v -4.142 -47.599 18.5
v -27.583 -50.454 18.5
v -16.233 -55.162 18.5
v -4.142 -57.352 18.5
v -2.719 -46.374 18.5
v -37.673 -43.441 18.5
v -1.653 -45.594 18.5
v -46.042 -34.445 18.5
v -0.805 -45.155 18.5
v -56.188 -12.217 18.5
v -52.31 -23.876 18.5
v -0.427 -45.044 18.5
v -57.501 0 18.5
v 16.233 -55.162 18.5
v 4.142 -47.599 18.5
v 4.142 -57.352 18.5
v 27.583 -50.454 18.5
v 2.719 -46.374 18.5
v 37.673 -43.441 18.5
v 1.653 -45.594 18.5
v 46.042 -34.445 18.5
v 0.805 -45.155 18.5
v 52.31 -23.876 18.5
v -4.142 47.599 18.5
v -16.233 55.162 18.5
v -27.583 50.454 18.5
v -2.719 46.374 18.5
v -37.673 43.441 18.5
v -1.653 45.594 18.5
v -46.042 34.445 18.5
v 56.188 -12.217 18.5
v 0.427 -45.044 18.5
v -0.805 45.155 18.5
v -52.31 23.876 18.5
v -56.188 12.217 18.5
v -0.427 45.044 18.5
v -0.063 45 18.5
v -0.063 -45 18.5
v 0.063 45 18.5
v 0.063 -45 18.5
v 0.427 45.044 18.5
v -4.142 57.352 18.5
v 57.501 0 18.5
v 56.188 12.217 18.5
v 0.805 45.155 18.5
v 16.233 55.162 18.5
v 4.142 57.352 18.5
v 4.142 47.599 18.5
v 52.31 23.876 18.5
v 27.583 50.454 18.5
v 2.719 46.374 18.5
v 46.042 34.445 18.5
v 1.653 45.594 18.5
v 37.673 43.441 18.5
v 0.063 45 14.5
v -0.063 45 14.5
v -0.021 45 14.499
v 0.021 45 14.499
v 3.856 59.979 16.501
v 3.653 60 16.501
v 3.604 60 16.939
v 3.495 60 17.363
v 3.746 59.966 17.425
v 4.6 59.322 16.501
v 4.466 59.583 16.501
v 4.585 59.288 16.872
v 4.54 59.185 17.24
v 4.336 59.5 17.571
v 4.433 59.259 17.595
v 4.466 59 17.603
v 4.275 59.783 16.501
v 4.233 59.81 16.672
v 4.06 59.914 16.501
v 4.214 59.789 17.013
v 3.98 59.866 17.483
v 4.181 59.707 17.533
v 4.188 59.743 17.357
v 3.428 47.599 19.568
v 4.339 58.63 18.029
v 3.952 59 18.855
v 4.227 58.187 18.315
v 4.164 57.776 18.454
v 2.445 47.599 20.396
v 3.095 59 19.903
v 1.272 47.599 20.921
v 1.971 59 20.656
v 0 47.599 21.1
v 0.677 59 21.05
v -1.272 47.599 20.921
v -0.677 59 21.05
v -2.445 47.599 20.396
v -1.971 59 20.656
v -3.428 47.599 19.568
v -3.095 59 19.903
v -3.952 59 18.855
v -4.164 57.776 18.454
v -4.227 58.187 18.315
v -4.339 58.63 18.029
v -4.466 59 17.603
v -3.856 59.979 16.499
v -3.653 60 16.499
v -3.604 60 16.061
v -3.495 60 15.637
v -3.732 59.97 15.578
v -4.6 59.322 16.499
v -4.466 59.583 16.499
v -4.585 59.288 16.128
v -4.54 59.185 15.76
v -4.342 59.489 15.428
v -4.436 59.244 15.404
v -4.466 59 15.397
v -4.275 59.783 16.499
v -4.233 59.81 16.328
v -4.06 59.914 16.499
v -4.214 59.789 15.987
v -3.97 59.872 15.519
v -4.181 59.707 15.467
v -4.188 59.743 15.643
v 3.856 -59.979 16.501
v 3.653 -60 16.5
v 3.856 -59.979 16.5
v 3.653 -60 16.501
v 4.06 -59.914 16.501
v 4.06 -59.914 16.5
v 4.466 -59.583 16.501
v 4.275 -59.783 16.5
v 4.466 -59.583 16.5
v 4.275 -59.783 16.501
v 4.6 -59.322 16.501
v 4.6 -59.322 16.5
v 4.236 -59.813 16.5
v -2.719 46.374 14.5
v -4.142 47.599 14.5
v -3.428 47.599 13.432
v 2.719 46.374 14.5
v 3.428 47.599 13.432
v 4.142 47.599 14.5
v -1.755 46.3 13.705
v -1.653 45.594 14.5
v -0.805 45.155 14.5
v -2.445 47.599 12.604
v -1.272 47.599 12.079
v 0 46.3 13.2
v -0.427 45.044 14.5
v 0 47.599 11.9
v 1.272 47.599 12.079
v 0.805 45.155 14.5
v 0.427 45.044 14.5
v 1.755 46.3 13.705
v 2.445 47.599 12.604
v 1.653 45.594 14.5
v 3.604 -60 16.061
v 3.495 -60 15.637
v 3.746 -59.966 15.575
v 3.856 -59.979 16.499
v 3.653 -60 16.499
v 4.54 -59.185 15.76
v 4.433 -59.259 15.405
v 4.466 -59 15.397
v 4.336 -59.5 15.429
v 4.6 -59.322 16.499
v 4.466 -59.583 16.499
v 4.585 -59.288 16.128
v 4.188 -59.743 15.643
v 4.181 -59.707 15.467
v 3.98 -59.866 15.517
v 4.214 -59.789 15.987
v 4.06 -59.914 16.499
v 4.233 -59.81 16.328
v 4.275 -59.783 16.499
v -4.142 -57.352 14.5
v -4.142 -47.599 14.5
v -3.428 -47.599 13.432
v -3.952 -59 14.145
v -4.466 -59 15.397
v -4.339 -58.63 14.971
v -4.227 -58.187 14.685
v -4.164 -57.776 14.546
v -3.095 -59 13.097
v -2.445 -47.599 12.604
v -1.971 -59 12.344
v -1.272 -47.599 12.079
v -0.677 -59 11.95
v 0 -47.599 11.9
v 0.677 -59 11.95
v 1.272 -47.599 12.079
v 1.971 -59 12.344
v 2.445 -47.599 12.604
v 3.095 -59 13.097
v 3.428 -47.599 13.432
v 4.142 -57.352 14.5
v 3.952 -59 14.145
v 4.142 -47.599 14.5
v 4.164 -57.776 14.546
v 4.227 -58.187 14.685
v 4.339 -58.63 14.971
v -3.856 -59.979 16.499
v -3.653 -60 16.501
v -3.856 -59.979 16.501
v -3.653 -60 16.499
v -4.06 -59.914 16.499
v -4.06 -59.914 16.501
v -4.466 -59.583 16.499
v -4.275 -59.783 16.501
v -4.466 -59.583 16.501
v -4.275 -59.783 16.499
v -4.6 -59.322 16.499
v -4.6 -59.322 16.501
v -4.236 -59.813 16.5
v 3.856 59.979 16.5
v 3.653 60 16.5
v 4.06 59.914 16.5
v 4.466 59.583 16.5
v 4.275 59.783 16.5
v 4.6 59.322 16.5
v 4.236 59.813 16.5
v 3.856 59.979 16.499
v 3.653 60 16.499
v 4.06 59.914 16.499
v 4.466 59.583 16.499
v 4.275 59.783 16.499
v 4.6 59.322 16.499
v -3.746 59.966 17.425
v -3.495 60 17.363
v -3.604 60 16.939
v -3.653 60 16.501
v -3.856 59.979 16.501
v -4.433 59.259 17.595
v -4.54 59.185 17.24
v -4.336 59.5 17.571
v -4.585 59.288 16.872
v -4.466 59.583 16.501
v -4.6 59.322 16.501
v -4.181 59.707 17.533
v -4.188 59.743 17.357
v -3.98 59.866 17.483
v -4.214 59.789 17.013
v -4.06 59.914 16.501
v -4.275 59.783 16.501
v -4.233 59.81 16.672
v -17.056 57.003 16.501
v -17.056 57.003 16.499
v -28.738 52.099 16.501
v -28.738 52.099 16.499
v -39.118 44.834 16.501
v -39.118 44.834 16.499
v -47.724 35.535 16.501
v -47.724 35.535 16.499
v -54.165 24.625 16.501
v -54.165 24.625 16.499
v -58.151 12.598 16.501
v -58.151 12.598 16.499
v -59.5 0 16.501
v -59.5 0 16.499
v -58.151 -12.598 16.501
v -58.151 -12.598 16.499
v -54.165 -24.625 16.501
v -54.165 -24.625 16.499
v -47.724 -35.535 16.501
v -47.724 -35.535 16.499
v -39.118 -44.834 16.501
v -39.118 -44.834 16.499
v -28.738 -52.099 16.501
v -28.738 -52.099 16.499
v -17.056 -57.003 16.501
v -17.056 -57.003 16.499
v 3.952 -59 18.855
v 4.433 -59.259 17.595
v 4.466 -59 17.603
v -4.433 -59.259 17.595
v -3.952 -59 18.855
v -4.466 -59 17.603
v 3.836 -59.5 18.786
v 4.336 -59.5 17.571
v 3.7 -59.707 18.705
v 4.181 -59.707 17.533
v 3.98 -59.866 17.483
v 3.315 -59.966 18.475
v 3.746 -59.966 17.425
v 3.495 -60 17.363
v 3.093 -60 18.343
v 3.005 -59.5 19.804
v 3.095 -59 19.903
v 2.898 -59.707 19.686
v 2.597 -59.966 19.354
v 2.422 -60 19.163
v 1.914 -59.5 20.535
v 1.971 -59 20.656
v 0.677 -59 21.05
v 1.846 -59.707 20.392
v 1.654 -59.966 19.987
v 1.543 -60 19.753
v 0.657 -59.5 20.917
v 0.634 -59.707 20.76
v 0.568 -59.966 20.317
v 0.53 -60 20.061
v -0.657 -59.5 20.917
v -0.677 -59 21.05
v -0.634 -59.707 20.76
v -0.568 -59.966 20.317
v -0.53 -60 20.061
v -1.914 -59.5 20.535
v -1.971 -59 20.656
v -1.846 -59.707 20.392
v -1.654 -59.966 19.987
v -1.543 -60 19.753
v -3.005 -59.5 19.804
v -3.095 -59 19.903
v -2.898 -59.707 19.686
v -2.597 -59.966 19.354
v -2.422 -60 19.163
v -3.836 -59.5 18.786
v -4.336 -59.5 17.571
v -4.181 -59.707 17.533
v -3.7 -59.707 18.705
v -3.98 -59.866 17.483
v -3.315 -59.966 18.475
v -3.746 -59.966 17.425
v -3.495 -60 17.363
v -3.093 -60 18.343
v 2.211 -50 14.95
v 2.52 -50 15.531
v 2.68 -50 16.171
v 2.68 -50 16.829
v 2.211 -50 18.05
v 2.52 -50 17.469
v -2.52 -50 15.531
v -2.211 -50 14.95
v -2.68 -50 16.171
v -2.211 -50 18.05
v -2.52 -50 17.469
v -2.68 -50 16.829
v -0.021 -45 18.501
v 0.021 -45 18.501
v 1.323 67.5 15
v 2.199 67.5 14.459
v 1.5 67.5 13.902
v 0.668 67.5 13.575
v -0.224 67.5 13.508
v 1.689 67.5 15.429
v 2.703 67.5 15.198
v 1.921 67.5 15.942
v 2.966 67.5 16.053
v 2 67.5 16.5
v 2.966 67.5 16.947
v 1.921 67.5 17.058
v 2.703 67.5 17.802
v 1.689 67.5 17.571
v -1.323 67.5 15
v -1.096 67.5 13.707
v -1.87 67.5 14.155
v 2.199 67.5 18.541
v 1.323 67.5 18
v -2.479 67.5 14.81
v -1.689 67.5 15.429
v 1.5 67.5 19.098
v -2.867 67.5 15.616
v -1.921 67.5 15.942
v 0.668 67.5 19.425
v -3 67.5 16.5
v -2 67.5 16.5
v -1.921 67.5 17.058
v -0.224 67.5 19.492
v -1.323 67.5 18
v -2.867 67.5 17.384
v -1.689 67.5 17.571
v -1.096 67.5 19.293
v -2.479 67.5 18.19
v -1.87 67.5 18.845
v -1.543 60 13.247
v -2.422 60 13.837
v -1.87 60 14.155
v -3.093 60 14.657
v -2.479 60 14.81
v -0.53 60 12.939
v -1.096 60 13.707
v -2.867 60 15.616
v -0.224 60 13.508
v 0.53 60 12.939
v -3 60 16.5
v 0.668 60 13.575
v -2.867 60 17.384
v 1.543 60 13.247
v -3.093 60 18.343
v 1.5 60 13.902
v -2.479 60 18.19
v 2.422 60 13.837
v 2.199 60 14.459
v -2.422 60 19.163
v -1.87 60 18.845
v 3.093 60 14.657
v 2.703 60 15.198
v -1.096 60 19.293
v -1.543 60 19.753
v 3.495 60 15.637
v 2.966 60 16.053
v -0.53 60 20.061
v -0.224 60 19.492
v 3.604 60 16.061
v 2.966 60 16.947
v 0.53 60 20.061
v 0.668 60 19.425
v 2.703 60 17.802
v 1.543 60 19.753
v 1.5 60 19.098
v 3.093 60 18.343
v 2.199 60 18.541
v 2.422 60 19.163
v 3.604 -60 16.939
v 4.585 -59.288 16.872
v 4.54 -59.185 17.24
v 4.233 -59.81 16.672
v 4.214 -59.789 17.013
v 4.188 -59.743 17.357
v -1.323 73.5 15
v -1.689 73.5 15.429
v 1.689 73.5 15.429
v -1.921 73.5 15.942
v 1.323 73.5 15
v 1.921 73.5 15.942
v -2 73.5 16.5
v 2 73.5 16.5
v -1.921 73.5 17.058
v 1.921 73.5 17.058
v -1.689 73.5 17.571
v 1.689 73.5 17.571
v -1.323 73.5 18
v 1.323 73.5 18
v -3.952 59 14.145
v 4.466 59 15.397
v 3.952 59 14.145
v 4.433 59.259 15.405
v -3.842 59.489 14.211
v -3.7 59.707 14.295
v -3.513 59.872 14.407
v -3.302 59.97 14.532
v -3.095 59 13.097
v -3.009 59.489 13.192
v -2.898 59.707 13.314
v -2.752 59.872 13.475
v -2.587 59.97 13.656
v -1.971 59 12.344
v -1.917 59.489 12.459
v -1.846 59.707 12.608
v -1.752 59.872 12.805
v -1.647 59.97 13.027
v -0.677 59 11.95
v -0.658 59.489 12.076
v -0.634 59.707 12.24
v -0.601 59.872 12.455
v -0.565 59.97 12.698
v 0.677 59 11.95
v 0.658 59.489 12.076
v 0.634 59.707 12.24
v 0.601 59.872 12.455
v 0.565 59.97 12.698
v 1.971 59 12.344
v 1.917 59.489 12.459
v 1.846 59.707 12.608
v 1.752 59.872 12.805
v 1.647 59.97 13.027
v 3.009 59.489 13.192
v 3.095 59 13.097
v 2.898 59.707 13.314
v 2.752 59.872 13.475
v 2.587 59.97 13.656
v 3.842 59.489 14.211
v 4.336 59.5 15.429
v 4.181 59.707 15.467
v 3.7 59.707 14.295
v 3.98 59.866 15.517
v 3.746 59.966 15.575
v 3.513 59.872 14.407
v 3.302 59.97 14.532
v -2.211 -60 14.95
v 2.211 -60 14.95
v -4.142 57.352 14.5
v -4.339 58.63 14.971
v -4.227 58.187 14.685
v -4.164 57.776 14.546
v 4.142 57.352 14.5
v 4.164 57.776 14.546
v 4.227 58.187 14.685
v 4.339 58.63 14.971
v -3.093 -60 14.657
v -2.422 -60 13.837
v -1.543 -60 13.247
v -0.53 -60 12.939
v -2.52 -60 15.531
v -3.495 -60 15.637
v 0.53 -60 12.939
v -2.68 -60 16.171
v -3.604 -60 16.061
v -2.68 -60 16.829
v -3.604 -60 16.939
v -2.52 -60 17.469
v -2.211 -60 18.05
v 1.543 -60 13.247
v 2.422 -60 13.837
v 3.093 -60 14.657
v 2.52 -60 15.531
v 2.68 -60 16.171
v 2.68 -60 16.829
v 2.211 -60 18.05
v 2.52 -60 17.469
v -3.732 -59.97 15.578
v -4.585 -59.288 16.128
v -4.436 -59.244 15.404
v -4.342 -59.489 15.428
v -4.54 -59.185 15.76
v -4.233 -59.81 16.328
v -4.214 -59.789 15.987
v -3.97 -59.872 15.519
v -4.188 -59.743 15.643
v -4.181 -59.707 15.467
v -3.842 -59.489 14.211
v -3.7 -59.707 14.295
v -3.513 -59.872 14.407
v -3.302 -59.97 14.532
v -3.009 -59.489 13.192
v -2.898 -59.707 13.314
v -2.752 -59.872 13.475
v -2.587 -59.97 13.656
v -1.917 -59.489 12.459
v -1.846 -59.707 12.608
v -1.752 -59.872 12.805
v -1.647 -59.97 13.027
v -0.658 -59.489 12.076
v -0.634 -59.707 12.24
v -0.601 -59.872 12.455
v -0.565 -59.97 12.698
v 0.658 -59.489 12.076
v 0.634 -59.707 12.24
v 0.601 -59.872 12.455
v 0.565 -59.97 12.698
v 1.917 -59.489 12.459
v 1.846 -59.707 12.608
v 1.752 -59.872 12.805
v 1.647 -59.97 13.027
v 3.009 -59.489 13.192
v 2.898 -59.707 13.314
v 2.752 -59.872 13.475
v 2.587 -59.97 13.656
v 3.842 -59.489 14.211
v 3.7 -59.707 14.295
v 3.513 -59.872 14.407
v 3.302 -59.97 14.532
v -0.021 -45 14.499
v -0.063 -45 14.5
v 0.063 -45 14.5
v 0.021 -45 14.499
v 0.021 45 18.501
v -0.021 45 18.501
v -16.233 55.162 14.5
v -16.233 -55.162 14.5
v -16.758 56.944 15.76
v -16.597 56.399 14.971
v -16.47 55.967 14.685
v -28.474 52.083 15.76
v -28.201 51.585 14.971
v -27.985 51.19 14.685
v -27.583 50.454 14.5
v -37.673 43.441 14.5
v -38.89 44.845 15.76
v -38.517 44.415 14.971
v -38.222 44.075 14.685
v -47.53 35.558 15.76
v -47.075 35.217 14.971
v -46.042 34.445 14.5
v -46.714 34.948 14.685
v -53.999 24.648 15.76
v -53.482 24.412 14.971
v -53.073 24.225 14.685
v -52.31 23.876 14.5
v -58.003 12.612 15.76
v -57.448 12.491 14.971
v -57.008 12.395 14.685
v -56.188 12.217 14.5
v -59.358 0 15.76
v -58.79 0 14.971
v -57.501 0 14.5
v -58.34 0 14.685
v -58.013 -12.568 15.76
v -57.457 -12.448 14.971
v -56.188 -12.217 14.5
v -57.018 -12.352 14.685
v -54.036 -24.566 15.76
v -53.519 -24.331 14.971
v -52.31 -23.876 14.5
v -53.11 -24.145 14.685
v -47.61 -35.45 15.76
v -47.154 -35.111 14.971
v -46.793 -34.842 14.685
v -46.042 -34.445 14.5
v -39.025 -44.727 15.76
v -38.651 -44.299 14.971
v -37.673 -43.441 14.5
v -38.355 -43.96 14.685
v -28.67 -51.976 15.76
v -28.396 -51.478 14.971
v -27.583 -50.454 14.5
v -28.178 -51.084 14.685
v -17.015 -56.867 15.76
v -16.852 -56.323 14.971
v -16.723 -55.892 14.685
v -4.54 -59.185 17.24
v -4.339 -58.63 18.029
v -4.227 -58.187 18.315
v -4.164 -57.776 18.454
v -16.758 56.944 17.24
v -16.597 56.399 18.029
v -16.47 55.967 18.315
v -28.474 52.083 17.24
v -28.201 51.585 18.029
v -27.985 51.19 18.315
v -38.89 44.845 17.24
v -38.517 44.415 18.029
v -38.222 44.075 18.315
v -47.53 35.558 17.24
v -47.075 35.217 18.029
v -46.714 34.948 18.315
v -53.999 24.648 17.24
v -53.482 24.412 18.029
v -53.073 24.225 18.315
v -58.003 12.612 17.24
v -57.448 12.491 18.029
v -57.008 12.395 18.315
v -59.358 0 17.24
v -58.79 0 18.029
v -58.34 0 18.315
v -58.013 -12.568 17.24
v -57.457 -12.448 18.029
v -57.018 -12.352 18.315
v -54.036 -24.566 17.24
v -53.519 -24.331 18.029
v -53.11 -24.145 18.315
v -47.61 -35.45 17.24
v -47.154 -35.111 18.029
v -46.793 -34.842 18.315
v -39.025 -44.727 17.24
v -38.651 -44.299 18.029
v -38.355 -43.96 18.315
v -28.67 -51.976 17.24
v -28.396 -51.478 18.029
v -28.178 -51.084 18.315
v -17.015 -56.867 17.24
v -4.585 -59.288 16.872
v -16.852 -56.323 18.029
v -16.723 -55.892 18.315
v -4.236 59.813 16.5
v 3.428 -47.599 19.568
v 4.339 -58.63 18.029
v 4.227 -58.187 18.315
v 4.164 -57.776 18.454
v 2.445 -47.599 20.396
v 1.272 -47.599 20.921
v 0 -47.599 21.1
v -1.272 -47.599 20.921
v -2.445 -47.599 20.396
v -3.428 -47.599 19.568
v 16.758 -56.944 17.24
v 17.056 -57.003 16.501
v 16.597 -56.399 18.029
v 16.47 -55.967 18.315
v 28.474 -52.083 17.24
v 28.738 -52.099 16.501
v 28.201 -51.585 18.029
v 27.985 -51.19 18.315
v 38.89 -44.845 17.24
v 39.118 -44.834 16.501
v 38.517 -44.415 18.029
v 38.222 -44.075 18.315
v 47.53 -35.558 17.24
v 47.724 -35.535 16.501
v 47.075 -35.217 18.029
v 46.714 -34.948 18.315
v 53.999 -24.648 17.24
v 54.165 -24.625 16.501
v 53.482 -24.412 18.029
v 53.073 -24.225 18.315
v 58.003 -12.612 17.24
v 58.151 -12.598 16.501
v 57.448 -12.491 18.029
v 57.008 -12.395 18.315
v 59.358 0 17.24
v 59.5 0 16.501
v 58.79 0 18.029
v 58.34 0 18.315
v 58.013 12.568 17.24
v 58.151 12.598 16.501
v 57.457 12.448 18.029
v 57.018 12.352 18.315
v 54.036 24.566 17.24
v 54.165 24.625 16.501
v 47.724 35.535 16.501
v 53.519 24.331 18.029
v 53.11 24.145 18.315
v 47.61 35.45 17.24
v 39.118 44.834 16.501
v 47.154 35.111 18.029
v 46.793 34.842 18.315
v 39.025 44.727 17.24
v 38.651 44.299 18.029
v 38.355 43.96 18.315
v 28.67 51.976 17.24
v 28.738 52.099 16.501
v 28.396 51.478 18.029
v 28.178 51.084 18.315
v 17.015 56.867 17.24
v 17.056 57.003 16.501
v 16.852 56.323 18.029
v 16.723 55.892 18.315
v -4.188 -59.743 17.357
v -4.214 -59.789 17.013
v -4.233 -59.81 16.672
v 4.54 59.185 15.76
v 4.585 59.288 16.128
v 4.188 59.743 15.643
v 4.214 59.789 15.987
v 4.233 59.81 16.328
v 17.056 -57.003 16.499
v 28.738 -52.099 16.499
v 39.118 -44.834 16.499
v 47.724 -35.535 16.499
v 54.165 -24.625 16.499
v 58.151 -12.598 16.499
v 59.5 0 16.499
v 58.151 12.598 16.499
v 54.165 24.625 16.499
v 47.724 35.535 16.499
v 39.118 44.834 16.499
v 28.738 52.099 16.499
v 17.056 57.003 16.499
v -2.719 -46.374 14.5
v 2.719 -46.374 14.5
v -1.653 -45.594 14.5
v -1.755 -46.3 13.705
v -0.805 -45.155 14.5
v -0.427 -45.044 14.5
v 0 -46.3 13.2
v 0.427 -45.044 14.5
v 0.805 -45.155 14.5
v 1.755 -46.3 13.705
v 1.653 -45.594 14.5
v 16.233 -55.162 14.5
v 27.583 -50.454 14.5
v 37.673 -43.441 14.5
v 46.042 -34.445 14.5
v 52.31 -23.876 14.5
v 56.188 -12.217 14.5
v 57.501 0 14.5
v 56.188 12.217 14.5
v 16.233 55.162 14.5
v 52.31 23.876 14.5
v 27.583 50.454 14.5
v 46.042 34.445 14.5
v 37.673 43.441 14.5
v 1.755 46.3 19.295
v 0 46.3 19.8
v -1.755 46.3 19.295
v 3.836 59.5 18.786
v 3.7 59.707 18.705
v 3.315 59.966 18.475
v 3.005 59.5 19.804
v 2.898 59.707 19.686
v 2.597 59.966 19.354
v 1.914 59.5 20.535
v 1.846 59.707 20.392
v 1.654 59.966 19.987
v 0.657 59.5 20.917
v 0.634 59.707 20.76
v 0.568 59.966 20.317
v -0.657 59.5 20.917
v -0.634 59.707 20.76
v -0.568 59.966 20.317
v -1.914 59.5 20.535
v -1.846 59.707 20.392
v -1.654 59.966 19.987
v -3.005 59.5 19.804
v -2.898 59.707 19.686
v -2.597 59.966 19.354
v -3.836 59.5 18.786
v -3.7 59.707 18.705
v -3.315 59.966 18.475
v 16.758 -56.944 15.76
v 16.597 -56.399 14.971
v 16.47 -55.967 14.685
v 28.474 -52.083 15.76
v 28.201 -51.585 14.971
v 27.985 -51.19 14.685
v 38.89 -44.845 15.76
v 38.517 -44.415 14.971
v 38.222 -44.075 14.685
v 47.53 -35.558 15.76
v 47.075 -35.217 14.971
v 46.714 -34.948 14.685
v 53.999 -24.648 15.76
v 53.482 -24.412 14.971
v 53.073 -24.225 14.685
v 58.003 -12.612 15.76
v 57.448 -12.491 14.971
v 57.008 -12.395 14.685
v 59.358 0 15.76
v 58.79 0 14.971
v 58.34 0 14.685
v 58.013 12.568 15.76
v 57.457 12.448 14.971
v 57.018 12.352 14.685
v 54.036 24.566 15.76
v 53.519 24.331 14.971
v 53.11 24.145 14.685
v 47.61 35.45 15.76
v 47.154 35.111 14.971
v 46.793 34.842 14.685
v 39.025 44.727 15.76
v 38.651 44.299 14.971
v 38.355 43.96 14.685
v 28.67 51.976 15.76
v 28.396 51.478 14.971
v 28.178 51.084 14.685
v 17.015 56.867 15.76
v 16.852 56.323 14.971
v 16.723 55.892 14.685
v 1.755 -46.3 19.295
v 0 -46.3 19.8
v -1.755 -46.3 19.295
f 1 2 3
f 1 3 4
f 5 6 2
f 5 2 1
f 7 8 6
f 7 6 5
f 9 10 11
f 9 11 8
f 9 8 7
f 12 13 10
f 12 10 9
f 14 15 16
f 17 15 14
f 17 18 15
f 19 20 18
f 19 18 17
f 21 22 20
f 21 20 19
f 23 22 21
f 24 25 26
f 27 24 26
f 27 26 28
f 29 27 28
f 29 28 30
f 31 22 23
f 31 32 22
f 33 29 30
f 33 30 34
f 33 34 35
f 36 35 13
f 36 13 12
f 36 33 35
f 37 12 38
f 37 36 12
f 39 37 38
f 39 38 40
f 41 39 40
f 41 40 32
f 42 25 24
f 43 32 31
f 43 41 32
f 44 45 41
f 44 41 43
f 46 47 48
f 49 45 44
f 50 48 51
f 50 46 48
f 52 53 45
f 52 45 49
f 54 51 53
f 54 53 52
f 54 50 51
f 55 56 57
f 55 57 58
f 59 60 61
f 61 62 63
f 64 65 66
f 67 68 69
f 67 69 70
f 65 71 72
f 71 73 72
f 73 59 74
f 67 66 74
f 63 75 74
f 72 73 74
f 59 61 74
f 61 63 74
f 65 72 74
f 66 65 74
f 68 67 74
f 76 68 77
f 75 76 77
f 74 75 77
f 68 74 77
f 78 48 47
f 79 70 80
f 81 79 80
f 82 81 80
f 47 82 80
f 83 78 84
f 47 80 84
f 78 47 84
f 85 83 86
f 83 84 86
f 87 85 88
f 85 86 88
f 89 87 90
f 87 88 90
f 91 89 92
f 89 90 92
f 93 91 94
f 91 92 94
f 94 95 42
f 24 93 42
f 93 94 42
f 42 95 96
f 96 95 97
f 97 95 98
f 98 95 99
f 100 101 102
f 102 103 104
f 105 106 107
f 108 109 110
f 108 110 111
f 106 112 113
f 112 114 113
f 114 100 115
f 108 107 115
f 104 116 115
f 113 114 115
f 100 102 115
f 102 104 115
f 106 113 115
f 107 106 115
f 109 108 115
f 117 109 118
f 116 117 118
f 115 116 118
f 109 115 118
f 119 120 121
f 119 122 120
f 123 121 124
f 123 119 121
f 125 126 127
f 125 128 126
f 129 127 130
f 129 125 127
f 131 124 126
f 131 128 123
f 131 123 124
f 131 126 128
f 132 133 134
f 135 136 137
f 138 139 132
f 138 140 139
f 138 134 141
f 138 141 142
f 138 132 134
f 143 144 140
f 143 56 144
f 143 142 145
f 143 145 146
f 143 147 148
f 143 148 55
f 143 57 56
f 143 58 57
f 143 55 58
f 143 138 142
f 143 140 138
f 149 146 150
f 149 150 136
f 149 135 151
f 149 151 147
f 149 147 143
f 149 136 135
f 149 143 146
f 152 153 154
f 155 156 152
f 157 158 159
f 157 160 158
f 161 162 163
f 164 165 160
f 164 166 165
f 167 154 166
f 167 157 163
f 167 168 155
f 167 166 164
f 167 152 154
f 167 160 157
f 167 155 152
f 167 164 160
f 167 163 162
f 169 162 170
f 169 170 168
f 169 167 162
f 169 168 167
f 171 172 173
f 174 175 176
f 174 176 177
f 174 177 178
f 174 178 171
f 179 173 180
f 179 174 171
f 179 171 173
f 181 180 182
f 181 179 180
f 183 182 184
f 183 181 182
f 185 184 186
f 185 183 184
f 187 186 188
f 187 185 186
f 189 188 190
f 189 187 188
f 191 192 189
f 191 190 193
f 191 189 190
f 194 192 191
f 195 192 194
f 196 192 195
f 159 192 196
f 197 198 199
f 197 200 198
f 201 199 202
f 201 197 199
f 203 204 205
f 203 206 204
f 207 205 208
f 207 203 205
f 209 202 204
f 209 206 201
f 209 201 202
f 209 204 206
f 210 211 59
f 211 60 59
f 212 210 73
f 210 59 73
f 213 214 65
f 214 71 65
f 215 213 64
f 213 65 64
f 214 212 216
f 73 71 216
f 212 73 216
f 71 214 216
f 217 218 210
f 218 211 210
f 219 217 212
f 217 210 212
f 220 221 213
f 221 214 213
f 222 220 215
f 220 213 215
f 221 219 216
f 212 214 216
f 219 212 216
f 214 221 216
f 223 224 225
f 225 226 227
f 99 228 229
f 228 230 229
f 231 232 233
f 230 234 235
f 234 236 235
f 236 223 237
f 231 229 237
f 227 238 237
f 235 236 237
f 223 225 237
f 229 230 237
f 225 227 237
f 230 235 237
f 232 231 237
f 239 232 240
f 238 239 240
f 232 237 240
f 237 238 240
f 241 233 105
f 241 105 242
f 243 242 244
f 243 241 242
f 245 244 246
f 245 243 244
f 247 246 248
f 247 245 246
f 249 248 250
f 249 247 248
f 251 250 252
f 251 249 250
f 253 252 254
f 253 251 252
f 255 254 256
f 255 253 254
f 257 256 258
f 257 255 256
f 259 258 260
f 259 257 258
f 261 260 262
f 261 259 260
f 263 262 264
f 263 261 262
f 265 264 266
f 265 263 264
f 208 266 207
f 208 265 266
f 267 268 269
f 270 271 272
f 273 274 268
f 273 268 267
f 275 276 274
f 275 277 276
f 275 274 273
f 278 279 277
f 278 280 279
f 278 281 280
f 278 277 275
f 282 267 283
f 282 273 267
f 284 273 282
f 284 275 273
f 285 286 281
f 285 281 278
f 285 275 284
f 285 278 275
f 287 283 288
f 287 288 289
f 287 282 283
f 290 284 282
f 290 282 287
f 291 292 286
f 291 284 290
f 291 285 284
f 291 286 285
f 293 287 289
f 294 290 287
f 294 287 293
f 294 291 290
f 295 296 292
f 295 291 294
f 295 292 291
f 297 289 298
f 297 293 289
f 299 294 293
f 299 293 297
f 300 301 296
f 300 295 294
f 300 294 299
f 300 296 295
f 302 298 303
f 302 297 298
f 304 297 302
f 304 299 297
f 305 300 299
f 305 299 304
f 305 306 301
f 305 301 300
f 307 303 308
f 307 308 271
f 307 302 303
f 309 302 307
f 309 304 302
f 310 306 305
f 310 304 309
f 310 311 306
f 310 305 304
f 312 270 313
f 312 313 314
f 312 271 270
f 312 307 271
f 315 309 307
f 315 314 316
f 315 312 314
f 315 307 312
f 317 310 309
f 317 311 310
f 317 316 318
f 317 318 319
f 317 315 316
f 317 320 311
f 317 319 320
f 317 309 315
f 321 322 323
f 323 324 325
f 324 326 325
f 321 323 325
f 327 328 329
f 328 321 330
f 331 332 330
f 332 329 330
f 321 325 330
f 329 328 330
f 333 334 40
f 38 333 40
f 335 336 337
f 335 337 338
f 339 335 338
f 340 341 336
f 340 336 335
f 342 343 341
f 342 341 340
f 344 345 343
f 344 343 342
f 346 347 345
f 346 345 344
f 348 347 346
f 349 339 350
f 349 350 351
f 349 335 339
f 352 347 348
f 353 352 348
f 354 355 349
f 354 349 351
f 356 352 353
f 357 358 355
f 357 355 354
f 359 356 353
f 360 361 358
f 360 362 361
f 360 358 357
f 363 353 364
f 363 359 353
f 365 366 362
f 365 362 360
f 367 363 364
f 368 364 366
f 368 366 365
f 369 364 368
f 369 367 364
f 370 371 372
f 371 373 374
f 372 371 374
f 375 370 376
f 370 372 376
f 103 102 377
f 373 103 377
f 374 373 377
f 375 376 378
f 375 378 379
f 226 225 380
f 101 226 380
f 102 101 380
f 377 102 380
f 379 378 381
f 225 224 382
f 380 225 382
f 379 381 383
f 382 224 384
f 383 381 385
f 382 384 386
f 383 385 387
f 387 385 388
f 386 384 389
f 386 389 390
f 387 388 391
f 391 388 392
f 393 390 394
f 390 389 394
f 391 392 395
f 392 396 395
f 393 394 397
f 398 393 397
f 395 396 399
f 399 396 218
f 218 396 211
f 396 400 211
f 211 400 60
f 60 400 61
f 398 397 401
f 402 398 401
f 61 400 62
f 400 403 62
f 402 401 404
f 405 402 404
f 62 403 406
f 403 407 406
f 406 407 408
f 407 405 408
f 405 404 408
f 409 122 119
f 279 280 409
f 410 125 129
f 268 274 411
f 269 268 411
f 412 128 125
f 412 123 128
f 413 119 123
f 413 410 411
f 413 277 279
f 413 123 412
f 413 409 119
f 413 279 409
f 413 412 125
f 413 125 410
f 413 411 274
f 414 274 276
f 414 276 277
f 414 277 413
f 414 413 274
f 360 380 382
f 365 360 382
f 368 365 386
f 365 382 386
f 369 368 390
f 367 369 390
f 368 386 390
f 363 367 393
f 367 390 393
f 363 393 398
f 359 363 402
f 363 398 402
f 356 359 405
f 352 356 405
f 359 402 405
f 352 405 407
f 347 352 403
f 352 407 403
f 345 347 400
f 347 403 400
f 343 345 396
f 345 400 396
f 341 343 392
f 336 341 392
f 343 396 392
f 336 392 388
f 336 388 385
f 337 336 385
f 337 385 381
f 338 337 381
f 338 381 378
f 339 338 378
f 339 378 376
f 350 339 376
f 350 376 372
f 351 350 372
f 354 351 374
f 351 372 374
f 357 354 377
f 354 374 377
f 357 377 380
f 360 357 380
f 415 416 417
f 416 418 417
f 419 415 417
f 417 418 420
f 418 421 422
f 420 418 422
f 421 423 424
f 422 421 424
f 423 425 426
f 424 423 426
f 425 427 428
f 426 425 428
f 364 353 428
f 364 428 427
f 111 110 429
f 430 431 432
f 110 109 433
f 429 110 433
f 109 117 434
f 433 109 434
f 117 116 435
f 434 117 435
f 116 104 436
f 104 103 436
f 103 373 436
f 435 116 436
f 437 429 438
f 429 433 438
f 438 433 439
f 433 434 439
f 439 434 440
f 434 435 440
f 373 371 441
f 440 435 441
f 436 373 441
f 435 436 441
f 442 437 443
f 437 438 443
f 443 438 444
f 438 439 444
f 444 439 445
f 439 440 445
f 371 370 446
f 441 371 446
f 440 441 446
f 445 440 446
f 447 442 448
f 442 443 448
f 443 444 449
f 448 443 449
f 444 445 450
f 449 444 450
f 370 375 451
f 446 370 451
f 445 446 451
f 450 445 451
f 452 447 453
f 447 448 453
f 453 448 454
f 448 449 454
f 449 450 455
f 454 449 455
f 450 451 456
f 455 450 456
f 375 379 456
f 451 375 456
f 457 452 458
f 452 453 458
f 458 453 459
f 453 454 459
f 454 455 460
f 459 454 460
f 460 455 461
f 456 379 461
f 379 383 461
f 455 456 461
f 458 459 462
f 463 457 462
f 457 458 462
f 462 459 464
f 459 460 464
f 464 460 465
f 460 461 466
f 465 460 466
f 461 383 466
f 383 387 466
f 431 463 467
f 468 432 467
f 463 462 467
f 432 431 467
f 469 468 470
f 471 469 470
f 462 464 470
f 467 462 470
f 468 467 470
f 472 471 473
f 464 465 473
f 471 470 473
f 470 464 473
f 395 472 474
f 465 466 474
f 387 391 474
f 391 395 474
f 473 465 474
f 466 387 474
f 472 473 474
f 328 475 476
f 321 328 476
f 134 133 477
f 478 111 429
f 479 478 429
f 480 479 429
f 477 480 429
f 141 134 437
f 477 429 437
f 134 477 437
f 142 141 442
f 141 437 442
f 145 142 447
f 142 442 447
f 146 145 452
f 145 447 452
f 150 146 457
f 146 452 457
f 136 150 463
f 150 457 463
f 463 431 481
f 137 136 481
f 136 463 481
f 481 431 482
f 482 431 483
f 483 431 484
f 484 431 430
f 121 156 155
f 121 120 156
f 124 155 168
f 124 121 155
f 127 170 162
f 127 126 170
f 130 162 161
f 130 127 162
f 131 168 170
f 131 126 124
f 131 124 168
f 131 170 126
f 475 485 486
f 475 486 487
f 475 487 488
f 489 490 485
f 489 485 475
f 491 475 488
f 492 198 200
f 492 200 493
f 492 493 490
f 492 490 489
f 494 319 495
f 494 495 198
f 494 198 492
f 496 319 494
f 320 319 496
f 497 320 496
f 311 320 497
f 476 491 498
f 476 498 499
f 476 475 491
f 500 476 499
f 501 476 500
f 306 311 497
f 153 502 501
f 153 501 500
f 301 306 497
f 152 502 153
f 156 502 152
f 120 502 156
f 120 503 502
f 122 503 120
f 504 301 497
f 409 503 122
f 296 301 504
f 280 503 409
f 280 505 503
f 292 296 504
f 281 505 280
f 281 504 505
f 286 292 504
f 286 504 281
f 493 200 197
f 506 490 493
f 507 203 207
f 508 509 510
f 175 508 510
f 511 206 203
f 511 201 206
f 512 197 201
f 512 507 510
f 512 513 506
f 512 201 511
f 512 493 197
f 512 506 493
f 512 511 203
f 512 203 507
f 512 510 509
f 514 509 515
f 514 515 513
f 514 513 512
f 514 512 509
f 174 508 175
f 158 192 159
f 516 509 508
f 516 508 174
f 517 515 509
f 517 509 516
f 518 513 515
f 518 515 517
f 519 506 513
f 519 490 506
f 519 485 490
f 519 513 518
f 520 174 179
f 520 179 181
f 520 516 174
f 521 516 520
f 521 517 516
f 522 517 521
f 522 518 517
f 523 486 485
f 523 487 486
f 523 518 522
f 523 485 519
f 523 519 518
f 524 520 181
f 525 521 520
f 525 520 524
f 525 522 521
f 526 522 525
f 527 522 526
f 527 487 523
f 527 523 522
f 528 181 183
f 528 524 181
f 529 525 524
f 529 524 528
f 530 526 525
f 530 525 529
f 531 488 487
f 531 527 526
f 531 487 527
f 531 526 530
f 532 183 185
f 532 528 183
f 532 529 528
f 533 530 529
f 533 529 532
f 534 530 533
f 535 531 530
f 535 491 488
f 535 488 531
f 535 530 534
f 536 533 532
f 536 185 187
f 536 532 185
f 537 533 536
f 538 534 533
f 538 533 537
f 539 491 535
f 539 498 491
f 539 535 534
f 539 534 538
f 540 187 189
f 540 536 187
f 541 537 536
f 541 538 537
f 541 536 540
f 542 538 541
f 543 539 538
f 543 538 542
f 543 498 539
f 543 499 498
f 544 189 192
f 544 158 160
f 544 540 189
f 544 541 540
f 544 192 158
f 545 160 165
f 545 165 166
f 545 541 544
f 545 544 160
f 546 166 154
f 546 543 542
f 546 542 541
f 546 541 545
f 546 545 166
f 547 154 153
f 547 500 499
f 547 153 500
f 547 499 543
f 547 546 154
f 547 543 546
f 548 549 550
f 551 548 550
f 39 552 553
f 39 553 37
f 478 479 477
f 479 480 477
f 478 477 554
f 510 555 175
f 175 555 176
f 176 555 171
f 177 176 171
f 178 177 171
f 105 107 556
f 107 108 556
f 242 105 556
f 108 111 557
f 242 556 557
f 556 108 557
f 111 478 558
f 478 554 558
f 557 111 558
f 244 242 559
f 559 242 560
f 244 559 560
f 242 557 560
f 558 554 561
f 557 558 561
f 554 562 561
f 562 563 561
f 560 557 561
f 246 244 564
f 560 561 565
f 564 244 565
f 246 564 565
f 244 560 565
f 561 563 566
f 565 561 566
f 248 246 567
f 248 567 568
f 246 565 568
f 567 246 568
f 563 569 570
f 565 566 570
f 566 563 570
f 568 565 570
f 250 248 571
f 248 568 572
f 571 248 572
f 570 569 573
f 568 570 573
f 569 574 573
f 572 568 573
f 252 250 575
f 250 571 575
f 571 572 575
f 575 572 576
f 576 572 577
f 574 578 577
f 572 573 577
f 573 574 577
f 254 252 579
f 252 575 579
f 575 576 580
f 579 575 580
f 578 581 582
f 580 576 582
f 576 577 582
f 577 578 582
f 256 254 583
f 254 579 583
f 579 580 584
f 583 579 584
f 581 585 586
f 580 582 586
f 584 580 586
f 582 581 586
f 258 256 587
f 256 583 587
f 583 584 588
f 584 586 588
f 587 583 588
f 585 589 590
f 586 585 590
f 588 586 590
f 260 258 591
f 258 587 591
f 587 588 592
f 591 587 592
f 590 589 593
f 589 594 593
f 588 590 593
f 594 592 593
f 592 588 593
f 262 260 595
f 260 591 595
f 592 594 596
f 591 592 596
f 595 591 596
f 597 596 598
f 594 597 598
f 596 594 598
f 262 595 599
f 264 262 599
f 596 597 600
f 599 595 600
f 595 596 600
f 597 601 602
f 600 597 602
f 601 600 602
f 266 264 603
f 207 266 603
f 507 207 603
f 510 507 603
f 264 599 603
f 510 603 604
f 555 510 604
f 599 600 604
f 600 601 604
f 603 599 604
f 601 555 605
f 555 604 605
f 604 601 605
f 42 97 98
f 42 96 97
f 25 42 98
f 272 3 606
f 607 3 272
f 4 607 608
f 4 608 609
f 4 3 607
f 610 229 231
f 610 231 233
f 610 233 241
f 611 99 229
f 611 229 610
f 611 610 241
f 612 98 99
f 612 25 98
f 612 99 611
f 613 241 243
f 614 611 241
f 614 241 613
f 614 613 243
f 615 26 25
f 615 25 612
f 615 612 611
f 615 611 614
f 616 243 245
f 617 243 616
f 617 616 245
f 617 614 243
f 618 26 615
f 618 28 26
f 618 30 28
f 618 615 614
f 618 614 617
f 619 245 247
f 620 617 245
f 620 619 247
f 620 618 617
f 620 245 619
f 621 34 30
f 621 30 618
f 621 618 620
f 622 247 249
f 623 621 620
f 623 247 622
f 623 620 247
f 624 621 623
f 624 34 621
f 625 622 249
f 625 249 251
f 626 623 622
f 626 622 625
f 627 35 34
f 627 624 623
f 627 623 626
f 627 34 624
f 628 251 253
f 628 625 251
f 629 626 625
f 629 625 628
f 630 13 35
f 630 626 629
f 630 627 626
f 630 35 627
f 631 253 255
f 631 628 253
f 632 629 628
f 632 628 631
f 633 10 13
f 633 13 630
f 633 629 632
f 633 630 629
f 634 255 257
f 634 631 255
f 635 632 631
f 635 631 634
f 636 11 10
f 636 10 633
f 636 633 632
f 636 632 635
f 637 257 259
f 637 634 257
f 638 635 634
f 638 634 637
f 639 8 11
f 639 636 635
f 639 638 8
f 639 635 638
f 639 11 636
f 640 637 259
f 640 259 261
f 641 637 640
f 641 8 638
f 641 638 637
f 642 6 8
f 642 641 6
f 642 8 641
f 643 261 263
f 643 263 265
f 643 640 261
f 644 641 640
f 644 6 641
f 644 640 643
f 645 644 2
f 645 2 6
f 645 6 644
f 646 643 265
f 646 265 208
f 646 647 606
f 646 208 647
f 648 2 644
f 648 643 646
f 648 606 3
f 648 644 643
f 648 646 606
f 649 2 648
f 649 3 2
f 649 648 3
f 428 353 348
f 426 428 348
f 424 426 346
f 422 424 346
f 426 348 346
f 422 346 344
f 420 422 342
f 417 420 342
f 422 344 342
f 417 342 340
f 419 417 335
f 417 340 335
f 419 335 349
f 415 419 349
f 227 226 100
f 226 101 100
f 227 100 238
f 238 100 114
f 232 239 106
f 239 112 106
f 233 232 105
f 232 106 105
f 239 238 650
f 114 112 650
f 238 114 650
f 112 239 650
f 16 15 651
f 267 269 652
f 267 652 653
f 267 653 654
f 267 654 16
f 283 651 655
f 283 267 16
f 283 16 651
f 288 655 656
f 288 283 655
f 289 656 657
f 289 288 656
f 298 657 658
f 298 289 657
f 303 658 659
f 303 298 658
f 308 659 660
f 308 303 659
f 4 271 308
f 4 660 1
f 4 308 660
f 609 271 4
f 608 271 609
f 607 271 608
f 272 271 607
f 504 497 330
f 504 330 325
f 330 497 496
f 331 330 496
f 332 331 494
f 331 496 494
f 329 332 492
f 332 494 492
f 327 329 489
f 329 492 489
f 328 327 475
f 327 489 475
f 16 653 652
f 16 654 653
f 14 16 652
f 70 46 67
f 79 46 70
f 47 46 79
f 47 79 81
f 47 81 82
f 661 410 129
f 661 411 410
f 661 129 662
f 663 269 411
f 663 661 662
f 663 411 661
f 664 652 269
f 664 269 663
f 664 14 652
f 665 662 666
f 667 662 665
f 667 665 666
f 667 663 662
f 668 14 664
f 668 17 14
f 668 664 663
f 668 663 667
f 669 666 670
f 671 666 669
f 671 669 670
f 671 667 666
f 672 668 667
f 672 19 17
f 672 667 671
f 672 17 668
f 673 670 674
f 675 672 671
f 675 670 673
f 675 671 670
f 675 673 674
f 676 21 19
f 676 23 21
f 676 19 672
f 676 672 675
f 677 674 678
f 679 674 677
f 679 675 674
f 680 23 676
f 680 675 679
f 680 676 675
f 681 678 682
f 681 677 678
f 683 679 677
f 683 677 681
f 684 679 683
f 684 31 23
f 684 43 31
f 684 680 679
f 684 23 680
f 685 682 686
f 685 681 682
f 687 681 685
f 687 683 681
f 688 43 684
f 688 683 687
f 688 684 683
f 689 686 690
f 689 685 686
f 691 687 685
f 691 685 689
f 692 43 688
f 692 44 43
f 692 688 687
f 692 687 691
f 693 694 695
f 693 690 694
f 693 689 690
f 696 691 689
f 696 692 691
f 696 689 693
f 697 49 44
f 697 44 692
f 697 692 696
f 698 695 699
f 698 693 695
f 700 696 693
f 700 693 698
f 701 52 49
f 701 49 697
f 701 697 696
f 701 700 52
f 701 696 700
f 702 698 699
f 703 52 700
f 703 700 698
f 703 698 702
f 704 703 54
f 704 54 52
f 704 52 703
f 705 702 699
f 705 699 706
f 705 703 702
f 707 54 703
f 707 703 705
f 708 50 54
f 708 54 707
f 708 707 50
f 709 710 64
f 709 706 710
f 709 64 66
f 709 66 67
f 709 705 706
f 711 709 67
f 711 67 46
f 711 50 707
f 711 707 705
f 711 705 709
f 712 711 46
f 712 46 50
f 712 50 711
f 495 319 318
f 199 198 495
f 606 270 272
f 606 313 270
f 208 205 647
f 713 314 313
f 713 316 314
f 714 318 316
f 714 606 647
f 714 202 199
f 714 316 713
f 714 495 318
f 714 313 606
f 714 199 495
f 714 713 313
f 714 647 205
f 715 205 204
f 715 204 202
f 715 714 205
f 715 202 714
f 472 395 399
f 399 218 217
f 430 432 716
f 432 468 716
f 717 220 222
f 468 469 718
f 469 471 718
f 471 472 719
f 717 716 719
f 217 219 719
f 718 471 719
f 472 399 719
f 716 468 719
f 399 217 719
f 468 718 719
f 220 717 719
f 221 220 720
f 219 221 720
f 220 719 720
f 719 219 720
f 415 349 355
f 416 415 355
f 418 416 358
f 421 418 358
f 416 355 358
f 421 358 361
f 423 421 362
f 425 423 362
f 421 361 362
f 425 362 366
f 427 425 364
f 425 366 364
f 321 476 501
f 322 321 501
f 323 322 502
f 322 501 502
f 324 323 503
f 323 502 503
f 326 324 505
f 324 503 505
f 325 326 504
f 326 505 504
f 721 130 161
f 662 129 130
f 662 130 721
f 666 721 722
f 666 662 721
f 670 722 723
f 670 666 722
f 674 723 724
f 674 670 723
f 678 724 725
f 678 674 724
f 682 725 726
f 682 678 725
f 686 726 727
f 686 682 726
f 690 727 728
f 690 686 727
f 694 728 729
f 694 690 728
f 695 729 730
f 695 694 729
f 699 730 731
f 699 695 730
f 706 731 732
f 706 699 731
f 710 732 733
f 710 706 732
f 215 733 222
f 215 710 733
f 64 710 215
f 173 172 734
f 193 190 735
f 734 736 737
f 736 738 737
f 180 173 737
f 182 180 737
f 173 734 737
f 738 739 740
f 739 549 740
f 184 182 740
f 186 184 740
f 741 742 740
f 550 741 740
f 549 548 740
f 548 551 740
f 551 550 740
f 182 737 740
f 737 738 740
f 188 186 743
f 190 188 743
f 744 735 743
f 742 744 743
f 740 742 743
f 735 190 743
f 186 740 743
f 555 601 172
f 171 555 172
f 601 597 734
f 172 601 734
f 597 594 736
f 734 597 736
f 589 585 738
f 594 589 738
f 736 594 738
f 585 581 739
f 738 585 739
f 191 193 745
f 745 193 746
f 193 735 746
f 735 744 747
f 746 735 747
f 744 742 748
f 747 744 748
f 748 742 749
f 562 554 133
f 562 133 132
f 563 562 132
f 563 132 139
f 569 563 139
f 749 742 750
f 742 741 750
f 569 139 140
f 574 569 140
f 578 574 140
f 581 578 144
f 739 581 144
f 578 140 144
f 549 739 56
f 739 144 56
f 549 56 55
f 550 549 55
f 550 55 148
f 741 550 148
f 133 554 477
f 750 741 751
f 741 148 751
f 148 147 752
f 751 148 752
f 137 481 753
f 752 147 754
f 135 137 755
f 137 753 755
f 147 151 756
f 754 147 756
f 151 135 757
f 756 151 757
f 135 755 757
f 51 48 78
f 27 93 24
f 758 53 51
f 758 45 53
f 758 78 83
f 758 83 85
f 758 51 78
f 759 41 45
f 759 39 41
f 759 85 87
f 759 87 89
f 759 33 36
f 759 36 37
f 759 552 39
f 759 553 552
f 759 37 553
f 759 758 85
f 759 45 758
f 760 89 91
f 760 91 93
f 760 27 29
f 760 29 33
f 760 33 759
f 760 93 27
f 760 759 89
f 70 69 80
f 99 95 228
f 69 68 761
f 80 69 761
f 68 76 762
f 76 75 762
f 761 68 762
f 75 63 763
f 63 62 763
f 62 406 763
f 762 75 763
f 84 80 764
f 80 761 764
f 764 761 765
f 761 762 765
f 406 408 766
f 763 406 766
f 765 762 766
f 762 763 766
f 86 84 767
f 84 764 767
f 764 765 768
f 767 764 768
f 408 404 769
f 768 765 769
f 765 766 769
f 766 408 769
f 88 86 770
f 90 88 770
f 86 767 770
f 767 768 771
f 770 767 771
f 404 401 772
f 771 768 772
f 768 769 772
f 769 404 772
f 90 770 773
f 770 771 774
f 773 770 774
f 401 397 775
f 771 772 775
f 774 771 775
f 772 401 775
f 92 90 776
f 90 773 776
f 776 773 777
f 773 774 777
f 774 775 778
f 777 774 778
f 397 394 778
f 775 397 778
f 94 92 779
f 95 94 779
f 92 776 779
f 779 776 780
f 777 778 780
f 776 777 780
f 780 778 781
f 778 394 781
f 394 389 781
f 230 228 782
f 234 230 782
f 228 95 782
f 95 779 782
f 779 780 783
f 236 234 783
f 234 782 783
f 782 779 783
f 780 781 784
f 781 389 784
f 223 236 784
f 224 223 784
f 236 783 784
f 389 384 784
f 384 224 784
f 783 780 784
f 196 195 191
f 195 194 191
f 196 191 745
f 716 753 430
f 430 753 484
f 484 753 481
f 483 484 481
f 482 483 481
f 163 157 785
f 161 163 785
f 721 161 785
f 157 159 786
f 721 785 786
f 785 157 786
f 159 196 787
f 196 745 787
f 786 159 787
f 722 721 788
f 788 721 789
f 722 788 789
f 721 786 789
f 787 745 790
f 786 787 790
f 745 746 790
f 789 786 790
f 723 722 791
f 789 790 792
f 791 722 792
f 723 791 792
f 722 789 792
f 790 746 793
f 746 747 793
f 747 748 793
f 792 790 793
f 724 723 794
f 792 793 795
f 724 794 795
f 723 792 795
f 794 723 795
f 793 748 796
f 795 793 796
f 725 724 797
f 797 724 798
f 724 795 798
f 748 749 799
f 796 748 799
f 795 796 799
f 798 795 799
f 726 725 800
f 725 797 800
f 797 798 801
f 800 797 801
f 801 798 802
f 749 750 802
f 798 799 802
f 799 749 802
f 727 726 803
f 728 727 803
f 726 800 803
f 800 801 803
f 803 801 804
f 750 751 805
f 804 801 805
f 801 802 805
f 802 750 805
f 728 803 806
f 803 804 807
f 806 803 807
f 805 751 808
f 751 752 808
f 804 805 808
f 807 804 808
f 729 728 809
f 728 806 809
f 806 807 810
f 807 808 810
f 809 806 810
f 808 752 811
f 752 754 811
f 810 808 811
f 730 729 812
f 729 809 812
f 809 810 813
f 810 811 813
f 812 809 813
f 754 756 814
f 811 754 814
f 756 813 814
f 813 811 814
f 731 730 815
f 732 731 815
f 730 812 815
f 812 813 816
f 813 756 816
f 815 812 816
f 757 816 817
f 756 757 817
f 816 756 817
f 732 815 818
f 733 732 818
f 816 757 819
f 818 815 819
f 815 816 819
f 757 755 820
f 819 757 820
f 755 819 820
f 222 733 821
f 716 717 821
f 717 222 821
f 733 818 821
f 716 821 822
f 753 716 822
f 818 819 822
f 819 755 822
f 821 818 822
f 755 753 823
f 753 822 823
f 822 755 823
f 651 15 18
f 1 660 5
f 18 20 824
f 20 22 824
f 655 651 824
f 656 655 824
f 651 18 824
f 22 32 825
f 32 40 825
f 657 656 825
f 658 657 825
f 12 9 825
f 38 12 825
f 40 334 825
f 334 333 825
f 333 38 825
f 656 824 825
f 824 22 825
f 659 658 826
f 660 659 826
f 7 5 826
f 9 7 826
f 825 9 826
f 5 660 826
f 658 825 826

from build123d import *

# Parameters (mm, degrees)
SKETCH018_R     = 59.5
PAD003_DEPTH    = 2
FILLET_R        = 1.999
SKETCH019_R     = 4.6
PAD004_DEPTH    = 15
POCKET007_DEPTH = 10
SKETCH022_R     = 3
PAD005_DEPTH    = 7.5
PAD006_DEPTH    = 6
FILLET001_R     = 1
CHAMFER_SIZE    = 2.599


with BuildPart() as part:
    # Sketch018 (on DatumPlane) → Pad003 (new body, symmetric)
    with BuildSketch(Plane.XY.offset(16.5)):
        Circle(SKETCH018_R)
    extrude(amount=PAD003_DEPTH, both=True)

    # Fillet
    fillet_edges = [part.edges().sort_by_distance(p)[0] for p in [
        (59.5, 0, 16.5),
        (-59.5, 0, 14.5),
        (-59.5, 0, 18.5),
    ]]
    fillet(fillet_edges, radius=FILLET_R)

    # Sketch019 (on DatumPlane) → Pad004 (join)
    with BuildSketch(Plane.XZ.offset(60)):
        with Locations((0, 16.5)):
            Circle(SKETCH019_R)
    pad004 = extrude(amount=-PAD004_DEPTH)

    # Mirrored001: Pad004 across XZ
    add(pad004.mirror(Plane.XZ))

    # Sketch020 (on Face19 of Mirrored001) → Pocket007 (cut)
    with BuildSketch(Plane(origin=(0, -60, 16.5), x_dir=(1, 0, 0), z_dir=(0, -1, 0))):
        with BuildLine():
            Line((-2.210769, 1.55), (2.210769, 1.55))
            ThreePointArc((2.210769, -1.55), (2.7, 0), (2.210769, 1.55))
            Line((-2.210769, -1.55), (2.210769, -1.55))
            ThreePointArc((-2.210769, 1.55), (-2.7, 0), (-2.210769, -1.55))
        make_face()
    extrude(amount=-POCKET007_DEPTH, mode=Mode.SUBTRACT)

    # Sketch022 (on Face8 of Pocket007) → Pad005 (join)
    with BuildSketch(Plane(origin=(0, 60, 16.5), x_dir=(-1, 0, 0), z_dir=(0, 1, 0))):
        Circle(SKETCH022_R)
    extrude(amount=PAD005_DEPTH)

    # Sketch023 (on Face21 of Pad005) → Pad006 (join)
    with BuildSketch(Plane(origin=(0, 67.5, 16.5), x_dir=(-1, 0, 0), z_dir=(0, 1, 0))):
        with BuildLine():
            Line((-1.322876, 1.5), (1.322876, 1.5))
            ThreePointArc((1.322876, -1.5), (2, 0), (1.322876, 1.5))
            Line((-1.322876, -1.5), (1.322876, -1.5))
            ThreePointArc((-1.322876, 1.5), (-2, 0), (-1.322876, -1.5))
        make_face()
    extrude(amount=PAD006_DEPTH)

    # Fillet001
    fillet001_edges = [part.edges().sort_by_distance(p)[0] for p in [
        (-4.6, -60, 16.5),
        (-4.6, 60, 16.5),
    ]]
    fillet(fillet001_edges, radius=FILLET001_R)

    # Chamfer
    chamfer_edges = [part.edges().sort_by_distance(p)[0] for p in [
        (0, 45, 21.1),
        (0, -45, 21.1),
        (0, -45, 11.9),
        (0, 45, 11.9),
    ]]
    chamfer(chamfer_edges, length=CHAMFER_SIZE)


solid = part.part
